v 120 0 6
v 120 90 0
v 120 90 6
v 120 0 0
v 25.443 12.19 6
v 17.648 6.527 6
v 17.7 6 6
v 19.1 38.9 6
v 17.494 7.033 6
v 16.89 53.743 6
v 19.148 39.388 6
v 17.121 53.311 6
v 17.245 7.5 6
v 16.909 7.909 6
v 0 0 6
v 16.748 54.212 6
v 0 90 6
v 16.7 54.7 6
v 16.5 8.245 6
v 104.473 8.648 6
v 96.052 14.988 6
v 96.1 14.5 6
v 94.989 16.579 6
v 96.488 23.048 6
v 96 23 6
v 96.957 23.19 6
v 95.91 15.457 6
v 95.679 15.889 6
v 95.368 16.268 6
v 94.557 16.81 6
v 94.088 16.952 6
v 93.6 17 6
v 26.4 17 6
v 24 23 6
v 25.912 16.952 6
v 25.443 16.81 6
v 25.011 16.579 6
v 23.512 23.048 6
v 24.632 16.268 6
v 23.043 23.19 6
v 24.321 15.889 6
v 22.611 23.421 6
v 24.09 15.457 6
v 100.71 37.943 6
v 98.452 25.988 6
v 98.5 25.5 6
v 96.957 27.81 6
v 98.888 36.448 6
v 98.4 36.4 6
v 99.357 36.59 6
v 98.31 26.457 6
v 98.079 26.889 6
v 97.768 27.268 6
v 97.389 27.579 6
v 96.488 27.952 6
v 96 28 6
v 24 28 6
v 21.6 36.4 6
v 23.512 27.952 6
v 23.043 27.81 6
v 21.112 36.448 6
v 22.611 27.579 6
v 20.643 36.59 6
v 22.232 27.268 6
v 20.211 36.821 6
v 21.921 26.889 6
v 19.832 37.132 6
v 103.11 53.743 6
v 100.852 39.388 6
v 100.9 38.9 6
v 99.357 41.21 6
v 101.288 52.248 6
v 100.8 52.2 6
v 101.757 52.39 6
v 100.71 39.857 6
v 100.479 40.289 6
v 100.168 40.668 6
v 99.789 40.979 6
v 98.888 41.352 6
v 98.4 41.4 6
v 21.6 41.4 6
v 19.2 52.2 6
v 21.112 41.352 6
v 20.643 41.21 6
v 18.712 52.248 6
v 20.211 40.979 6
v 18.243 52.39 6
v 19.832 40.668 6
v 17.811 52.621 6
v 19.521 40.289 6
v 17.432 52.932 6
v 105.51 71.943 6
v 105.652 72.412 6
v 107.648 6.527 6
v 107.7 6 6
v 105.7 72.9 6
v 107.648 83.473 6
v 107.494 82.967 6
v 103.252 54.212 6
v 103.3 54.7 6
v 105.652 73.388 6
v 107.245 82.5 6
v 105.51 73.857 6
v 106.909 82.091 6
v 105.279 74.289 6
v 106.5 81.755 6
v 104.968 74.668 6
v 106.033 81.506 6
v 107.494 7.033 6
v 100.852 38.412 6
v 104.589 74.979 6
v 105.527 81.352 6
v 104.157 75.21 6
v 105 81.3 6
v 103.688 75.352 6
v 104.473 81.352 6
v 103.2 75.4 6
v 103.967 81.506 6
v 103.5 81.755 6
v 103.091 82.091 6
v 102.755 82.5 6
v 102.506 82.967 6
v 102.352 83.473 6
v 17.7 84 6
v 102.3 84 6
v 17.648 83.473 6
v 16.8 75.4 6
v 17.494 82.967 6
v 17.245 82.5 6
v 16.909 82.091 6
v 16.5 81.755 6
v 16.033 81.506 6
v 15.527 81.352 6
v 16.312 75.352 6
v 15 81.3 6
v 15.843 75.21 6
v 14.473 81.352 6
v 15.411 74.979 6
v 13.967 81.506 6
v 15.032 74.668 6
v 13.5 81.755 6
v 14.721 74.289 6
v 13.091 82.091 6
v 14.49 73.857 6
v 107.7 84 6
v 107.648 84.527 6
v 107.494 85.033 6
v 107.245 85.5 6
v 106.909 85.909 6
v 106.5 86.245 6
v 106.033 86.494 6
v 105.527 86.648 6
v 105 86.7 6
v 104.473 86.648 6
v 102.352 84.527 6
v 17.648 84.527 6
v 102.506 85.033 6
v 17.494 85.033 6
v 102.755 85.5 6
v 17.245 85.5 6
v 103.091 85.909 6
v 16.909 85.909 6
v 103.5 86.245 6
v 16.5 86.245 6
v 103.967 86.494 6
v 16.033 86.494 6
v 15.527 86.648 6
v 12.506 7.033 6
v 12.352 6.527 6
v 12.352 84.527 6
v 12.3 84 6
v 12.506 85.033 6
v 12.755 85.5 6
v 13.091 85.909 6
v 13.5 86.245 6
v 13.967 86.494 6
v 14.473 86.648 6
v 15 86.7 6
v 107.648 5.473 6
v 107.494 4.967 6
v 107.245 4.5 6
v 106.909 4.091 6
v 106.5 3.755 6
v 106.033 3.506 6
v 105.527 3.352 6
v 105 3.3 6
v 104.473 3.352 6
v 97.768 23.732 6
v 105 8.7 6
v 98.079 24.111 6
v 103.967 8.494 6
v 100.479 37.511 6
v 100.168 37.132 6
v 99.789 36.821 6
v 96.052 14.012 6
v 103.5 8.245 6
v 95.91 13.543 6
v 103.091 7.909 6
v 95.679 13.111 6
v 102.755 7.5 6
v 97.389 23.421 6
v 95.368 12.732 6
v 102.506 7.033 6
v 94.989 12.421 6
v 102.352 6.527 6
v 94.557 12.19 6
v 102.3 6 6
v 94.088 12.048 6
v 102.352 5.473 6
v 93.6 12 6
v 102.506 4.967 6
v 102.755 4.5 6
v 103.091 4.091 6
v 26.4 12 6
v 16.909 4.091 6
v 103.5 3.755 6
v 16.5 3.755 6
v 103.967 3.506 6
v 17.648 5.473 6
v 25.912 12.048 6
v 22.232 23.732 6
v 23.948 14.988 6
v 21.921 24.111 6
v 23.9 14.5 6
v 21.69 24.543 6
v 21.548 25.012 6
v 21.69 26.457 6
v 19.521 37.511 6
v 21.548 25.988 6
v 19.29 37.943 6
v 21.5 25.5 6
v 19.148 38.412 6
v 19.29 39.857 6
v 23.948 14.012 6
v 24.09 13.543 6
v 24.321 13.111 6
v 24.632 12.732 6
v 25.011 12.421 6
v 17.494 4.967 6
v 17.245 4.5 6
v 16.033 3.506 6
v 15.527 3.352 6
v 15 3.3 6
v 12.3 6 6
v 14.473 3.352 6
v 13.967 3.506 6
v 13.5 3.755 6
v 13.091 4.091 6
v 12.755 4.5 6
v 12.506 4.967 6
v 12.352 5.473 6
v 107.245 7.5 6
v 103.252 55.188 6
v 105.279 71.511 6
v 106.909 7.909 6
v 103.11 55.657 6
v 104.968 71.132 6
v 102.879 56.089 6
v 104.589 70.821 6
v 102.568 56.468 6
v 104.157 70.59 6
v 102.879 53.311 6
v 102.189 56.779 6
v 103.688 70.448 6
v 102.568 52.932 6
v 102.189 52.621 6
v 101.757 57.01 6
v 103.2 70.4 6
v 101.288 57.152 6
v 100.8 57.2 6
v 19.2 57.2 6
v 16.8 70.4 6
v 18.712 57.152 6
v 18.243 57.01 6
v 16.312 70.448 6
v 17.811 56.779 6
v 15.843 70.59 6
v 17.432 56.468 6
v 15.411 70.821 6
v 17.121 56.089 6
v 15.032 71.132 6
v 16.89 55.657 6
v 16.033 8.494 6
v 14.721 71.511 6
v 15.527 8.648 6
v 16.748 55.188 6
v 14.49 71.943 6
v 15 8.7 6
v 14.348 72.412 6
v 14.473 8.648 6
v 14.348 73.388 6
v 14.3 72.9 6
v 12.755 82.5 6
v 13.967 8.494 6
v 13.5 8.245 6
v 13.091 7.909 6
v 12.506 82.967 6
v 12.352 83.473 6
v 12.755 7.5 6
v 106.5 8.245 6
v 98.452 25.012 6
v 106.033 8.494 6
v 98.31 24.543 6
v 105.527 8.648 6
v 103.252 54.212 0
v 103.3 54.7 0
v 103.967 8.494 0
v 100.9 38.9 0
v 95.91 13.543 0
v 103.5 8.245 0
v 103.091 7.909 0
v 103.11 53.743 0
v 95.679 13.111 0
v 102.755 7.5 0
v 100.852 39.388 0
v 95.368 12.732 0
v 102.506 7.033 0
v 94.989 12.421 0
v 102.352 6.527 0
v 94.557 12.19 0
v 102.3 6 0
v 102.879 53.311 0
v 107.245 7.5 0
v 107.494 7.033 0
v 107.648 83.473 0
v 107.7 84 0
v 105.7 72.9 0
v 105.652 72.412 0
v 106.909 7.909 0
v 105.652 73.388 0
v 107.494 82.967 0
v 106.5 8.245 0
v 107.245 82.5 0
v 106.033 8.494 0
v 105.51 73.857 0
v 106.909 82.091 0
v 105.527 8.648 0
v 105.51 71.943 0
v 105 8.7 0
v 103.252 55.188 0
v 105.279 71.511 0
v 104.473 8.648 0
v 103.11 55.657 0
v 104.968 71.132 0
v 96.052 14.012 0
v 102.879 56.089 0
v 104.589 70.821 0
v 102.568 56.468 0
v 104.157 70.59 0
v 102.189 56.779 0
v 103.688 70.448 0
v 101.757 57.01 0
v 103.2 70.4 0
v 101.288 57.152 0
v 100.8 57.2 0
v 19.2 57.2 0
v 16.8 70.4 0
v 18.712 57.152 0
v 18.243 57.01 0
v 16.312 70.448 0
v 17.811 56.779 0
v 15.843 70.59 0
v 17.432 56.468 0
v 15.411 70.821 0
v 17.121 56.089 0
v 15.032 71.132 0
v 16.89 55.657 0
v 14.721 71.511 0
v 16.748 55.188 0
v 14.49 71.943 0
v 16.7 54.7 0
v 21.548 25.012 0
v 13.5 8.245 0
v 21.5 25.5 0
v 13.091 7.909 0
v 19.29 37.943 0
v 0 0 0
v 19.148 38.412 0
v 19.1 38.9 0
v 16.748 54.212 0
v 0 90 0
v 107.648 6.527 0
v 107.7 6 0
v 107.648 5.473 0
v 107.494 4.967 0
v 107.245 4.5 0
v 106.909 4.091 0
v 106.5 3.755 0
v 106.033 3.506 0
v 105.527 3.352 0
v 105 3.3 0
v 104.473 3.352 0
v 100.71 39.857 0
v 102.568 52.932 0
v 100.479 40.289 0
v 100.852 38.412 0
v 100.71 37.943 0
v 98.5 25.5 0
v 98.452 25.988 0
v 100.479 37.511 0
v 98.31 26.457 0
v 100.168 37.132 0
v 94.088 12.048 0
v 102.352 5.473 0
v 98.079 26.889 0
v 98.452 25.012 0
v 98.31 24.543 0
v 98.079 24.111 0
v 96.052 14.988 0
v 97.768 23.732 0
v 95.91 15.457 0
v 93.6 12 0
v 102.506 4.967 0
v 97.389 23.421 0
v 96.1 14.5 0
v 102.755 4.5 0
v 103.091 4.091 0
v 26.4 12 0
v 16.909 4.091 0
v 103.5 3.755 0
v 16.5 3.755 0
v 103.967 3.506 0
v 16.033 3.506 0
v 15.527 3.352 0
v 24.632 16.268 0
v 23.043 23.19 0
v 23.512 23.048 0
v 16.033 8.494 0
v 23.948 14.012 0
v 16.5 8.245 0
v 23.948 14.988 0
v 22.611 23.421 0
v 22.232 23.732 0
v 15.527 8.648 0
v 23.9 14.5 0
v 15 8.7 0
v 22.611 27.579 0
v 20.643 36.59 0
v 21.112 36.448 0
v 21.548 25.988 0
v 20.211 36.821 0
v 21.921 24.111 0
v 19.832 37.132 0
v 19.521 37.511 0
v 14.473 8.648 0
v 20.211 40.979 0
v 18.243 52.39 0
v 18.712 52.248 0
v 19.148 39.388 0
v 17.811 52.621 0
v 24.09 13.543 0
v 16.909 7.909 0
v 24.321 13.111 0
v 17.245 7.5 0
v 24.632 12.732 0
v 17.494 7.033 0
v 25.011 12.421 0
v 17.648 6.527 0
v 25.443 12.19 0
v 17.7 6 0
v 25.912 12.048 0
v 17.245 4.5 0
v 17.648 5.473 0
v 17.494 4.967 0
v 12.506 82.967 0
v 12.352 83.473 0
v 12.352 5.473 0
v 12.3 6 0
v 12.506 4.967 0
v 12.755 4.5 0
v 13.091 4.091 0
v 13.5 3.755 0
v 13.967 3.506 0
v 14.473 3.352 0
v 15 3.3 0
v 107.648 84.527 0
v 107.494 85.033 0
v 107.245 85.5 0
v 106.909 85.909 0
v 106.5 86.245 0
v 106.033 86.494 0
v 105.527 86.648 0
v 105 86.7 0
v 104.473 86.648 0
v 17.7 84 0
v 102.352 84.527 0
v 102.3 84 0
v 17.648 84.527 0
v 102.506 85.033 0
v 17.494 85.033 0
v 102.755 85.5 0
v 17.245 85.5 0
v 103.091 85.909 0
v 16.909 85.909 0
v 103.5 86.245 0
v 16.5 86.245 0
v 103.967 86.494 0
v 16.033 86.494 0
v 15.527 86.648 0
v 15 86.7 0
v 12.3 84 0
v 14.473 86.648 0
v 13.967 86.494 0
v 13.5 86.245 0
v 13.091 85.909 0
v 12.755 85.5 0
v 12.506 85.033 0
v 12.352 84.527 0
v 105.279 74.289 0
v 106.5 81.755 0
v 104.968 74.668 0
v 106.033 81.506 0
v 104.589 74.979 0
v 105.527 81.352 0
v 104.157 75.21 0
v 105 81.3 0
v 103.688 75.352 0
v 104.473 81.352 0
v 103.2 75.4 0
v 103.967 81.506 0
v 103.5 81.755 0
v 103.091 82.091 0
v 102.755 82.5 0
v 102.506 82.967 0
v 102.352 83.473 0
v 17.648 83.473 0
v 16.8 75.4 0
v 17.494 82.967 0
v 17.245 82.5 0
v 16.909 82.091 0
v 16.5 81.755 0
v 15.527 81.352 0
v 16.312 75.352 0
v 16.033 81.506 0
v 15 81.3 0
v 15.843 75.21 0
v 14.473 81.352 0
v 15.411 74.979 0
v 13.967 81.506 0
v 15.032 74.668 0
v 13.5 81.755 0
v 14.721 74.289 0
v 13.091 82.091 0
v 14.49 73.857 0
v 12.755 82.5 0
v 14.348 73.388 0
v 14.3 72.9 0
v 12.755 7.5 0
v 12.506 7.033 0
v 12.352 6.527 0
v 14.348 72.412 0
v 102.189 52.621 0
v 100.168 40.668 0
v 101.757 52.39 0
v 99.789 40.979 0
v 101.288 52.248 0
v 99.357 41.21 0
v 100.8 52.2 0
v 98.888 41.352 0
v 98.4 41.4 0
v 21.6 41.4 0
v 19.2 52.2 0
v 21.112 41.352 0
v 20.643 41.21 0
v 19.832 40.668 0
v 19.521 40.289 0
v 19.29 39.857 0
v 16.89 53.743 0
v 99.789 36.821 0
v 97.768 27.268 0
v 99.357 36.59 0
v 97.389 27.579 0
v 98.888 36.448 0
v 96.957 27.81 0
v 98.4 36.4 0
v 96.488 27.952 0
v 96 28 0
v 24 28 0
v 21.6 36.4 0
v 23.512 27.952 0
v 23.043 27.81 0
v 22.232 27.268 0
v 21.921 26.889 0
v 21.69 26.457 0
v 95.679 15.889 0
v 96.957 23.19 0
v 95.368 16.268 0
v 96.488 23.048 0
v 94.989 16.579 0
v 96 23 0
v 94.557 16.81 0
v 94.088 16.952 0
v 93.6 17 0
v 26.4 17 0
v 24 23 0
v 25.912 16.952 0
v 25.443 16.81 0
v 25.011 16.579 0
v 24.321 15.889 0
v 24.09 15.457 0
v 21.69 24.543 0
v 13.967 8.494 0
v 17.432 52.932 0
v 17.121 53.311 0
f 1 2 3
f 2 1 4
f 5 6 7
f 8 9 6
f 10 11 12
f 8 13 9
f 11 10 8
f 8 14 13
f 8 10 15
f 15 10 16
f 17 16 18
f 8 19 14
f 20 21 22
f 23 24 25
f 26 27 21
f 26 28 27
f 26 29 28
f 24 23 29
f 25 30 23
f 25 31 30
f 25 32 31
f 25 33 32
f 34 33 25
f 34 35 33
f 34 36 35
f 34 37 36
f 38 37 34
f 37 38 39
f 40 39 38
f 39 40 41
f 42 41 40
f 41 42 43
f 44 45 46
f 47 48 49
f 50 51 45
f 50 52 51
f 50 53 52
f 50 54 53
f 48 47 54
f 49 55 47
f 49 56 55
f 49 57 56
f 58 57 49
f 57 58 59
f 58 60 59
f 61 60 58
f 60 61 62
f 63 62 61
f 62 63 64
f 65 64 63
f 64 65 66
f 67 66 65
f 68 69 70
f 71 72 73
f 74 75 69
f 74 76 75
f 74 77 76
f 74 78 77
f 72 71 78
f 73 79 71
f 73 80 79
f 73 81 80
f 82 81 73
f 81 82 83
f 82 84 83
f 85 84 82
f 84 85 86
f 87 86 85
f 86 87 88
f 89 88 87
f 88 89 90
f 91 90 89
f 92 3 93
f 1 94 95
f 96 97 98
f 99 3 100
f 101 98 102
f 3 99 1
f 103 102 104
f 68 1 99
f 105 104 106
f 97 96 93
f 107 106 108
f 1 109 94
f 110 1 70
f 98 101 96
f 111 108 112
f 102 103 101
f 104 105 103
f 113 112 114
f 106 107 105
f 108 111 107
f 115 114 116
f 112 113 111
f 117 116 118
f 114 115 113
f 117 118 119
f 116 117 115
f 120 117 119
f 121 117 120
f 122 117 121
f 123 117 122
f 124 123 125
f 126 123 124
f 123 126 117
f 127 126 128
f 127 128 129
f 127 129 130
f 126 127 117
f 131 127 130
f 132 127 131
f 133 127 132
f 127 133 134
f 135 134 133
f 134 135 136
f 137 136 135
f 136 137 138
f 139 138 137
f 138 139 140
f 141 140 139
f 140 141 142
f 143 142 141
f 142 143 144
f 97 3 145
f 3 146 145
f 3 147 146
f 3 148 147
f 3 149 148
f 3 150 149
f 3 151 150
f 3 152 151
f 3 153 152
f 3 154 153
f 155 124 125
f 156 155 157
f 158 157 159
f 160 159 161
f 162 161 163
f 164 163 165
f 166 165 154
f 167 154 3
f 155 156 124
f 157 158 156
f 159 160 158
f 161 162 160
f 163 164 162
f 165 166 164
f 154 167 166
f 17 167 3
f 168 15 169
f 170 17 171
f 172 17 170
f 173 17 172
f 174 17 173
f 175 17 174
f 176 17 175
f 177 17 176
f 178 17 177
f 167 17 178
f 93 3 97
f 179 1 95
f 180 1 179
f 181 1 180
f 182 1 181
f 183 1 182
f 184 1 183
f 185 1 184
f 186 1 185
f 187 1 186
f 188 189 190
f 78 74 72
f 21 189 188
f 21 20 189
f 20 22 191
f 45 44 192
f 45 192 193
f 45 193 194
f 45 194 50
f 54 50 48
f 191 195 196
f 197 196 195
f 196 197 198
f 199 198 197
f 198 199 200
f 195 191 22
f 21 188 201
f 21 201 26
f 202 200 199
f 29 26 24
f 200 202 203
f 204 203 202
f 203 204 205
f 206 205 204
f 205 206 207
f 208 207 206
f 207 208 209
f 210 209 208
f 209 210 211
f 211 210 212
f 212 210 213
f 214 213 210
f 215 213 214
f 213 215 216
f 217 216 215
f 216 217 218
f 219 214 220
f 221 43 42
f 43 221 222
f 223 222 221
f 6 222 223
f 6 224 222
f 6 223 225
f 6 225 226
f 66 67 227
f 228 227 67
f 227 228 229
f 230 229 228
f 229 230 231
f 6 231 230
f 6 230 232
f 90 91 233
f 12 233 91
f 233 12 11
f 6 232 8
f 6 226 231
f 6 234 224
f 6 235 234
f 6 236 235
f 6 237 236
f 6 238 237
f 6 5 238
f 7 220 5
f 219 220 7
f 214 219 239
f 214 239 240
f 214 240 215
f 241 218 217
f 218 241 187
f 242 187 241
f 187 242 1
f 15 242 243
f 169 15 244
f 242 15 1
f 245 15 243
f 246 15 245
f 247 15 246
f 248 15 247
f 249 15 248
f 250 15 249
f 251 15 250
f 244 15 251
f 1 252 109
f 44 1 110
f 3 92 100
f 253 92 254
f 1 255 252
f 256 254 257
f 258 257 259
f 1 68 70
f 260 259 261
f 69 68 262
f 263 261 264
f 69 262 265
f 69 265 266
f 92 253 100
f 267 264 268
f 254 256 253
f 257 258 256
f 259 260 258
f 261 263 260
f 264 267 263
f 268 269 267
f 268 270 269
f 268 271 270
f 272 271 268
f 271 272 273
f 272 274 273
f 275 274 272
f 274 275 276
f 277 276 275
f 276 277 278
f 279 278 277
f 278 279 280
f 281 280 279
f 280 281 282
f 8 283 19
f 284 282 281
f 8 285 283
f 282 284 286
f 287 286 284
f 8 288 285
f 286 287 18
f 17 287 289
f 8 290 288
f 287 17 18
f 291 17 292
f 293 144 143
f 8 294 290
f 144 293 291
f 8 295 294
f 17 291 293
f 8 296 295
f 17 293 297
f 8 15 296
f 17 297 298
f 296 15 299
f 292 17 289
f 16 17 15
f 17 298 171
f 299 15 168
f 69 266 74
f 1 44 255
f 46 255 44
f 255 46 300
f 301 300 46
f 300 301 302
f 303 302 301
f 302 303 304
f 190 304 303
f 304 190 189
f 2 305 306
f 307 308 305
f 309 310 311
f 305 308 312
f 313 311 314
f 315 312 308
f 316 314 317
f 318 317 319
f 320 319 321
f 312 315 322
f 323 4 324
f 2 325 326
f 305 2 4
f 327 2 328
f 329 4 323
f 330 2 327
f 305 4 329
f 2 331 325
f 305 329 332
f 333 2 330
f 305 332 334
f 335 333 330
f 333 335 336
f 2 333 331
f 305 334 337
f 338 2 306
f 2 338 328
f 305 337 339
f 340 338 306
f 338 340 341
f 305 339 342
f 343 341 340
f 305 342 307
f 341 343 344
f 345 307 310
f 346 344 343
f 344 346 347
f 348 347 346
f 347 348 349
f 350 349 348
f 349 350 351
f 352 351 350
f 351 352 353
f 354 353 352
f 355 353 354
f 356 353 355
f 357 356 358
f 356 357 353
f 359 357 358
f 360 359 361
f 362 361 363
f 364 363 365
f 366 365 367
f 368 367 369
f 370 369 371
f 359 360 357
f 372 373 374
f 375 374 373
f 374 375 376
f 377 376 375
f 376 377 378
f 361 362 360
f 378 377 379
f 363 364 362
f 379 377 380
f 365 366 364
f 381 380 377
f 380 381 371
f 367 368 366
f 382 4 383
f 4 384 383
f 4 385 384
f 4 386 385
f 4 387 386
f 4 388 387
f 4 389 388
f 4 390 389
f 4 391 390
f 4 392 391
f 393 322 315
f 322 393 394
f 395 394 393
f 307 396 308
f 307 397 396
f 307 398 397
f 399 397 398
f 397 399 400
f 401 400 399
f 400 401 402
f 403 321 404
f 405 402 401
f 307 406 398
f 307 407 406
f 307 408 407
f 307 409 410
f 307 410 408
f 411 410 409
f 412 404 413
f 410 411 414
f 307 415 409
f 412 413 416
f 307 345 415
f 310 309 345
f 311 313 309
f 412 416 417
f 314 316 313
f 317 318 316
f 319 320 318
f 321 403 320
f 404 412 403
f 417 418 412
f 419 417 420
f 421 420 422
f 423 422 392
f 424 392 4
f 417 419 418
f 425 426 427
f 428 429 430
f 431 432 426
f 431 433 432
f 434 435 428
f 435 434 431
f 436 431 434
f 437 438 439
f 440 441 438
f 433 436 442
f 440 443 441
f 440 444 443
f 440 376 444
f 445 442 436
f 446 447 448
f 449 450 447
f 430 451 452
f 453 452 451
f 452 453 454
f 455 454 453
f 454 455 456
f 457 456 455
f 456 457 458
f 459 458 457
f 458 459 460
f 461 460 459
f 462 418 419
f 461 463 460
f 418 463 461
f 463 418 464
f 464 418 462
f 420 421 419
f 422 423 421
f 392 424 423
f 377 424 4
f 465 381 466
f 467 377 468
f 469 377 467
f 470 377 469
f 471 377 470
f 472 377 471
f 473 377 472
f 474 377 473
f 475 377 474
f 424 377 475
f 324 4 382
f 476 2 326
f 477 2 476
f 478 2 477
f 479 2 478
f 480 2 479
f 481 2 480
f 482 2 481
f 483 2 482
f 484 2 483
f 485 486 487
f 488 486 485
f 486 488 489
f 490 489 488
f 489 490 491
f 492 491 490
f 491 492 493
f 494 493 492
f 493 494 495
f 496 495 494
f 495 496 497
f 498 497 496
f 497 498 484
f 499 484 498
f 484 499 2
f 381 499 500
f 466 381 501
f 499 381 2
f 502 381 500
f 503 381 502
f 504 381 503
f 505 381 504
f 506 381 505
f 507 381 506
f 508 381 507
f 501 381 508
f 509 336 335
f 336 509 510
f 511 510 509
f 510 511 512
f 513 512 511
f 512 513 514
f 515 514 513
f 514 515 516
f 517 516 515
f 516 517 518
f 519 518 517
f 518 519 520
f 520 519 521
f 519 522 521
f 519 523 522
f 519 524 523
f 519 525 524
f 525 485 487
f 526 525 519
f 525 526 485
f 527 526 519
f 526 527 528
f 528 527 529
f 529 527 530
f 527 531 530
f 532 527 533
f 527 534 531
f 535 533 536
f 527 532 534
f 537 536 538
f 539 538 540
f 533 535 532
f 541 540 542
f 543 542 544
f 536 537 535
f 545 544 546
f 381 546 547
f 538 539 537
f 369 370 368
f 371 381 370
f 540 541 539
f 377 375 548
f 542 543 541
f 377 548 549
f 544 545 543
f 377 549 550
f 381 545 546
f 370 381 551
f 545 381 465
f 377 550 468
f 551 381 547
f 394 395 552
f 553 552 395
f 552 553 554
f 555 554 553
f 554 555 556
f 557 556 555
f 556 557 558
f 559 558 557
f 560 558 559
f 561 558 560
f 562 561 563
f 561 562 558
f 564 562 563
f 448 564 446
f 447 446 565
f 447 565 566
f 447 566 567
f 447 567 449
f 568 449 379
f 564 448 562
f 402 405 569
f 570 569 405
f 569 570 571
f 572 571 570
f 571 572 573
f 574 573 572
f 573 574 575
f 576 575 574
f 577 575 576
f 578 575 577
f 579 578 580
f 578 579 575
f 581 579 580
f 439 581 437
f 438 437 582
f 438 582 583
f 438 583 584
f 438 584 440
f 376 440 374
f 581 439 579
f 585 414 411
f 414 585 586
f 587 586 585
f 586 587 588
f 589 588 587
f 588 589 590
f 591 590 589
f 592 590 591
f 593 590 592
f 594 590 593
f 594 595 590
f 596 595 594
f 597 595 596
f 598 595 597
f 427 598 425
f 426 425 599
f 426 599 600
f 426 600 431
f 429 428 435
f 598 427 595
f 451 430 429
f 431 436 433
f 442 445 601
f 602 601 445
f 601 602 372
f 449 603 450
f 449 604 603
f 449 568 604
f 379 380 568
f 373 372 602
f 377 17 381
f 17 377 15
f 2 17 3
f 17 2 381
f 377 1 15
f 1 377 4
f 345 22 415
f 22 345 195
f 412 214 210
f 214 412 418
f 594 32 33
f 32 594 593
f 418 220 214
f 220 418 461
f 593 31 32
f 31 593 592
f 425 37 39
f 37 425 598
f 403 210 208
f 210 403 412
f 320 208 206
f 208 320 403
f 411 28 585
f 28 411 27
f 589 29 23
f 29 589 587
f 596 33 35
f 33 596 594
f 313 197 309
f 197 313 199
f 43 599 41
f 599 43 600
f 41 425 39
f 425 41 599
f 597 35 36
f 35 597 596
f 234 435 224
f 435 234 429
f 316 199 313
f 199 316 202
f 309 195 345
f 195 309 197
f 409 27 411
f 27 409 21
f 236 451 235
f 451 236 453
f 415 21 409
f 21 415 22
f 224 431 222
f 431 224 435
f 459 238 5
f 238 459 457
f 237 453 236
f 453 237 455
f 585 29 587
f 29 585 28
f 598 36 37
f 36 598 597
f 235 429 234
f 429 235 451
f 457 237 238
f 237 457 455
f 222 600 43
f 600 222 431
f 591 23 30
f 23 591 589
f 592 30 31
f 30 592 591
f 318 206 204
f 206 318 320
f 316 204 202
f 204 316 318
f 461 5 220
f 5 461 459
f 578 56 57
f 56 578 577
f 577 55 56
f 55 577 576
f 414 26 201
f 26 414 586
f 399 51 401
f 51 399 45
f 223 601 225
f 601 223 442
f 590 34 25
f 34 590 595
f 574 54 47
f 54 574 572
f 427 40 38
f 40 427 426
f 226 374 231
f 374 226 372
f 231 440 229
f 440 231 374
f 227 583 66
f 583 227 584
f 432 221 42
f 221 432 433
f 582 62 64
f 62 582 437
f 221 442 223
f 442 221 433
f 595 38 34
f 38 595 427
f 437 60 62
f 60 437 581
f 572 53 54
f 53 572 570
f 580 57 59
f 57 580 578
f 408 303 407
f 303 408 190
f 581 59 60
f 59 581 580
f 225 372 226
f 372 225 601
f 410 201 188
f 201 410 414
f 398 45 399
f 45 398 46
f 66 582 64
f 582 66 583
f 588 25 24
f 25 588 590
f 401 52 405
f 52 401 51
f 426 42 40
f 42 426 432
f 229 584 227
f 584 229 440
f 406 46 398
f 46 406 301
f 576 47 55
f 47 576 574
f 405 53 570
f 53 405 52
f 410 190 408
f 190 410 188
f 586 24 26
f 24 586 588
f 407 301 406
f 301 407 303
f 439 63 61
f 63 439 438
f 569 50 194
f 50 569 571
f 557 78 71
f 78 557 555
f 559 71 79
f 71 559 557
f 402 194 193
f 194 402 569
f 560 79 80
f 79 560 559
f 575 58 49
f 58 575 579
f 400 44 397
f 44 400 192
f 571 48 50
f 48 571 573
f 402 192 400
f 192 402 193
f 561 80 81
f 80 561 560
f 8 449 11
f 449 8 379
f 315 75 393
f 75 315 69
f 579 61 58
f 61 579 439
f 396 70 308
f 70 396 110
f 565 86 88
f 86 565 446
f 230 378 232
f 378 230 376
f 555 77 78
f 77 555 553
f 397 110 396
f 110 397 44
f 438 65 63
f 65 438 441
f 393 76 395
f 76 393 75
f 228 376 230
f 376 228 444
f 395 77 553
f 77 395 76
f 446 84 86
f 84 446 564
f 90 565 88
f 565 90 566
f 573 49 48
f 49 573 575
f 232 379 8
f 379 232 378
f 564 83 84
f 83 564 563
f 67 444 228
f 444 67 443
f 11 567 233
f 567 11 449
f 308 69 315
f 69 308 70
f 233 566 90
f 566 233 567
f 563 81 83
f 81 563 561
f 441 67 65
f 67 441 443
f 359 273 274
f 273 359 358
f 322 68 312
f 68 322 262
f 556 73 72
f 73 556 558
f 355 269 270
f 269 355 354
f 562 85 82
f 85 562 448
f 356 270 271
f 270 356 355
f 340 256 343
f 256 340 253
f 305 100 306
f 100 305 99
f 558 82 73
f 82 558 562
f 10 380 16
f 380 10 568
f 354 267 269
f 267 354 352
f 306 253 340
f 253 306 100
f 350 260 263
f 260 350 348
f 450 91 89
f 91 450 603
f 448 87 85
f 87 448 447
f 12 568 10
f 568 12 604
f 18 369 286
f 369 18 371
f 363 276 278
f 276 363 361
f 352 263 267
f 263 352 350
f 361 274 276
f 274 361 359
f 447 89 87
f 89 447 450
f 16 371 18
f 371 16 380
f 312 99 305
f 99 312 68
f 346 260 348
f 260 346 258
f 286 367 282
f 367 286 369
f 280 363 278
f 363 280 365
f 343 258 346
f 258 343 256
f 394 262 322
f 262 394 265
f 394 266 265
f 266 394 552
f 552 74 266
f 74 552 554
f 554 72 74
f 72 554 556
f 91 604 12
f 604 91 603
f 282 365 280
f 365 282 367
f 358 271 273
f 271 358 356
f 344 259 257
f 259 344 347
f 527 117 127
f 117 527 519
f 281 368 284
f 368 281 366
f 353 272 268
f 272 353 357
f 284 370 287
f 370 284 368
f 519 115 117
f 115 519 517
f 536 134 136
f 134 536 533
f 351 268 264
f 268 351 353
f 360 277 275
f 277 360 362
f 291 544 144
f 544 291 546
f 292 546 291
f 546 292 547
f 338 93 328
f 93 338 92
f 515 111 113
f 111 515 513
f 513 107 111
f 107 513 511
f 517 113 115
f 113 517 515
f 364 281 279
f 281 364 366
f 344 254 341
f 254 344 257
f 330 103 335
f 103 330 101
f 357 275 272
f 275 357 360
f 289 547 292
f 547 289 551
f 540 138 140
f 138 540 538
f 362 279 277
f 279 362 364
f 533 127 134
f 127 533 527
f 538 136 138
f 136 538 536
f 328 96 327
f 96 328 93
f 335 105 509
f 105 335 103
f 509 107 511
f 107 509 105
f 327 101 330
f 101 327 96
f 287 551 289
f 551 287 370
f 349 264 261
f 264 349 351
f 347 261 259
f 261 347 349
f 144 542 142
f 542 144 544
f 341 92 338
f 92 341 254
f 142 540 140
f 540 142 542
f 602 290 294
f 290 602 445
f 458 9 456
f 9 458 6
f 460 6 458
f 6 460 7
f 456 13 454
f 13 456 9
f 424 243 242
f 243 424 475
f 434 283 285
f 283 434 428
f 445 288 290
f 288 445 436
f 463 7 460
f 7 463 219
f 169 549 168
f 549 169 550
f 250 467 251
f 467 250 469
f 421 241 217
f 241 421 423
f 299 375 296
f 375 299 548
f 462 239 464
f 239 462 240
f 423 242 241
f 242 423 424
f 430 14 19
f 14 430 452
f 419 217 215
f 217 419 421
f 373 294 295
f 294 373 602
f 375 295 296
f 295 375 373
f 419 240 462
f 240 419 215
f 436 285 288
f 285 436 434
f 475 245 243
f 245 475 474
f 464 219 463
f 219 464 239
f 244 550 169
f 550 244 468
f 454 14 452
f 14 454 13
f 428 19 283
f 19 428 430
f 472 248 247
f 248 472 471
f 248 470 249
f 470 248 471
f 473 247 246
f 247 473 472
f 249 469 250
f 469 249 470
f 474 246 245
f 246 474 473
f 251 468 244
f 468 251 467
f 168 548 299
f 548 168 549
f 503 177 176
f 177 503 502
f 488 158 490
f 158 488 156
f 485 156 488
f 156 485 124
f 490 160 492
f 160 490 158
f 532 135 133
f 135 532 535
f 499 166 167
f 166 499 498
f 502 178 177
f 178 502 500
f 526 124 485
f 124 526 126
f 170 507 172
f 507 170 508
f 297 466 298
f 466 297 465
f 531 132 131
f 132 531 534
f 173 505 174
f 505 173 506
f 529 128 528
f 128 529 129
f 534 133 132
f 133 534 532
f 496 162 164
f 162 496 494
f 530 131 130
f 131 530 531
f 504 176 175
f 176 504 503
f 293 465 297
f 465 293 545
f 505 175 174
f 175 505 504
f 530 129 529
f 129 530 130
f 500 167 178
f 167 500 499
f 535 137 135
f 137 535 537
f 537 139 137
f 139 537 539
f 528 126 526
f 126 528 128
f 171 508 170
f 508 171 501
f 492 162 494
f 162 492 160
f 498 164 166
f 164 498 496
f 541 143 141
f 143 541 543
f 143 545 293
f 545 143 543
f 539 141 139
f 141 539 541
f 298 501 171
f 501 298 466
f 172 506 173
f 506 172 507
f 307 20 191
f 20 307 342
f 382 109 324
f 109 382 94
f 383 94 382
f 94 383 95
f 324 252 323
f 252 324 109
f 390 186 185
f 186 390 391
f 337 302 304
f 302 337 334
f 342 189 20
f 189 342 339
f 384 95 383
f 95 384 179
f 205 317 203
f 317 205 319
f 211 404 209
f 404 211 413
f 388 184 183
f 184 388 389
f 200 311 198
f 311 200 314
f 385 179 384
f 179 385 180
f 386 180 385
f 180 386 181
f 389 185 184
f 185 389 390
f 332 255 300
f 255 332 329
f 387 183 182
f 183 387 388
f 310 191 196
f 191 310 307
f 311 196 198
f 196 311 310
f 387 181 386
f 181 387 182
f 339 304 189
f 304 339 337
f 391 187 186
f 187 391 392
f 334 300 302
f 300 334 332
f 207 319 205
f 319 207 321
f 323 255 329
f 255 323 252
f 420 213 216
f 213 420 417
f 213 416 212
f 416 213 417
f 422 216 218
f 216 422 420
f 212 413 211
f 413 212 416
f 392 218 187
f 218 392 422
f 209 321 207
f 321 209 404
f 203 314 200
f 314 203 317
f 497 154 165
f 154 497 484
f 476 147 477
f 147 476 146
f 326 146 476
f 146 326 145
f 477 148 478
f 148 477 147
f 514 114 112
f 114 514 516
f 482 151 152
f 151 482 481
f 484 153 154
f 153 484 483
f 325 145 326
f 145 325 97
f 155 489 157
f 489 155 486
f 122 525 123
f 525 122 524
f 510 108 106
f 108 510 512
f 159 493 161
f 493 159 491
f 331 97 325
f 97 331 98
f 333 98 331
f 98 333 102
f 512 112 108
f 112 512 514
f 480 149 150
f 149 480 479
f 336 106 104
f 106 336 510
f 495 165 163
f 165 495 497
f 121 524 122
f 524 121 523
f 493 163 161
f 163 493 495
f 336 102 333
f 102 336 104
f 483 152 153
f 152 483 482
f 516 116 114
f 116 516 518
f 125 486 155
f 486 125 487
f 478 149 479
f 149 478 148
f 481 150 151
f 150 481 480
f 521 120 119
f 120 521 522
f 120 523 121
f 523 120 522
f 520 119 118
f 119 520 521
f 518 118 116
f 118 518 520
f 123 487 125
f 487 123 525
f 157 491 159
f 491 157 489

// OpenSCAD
$fn = 32;

// ----------------------------------------------------------------------
// Slotted panel: 120 x 90 mm, 5 рядов of slots
// ----------------------------------------------------------------------

// --- parameters (mm) ---
panel_w = 120;            // panel width
panel_d = 90;             // panel depth
thick = 6;                // panel thickness
slot_w = 5;               // slot width
pitch0 = 11;              // first row pitch
pitch_step = 2.4;         // pitch increase per row
margin = 12;              // margin around the slot field
rows = 5;                 // number of slot rows
mount_d = 5.4;            // mounting holes
mount_x = 45;             // mounting hole offset

difference() {
  union() {
    cube([panel_w, panel_d, thick]);
  }
  /* slot rows: stadium shaped cutters, 2.5 mm clear of both faces */
  /* row 0: pitch 11, length 67.2 */
  hull() {
    translate([26.4, 14.5, -2.5]) cylinder(h = thick + 5, d = slot_w);
    translate([93.6, 14.5, -2.5]) cylinder(h = thick + 5, d = slot_w);
  }
  /* row 1: pitch 13.4, length 72 */
  hull() {
    translate([24, 25.5, -2.5]) cylinder(h = thick + 5, d = slot_w);
    translate([96, 25.5, -2.5]) cylinder(h = thick + 5, d = slot_w);
  }
  /* row 2: pitch 15.8, length 76.8 */
  hull() {
    translate([21.6, 38.9, -2.5]) cylinder(h = thick + 5, d = slot_w);
    translate([98.4, 38.9, -2.5]) cylinder(h = thick + 5, d = slot_w);
  }
  /* row 3: pitch 18.2, length 81.6 */
  hull() {
    translate([19.2, 54.7, -2.5]) cylinder(h = thick + 5, d = slot_w);
    translate([100.8, 54.7, -2.5]) cylinder(h = thick + 5, d = slot_w);
  }
  /* row 4: pitch 20.6, length 86.4 */
  hull() {
    translate([16.8, 72.9, -2.5]) cylinder(h = thick + 5, d = slot_w);
    translate([103.2, 72.9, -2.5]) cylinder(h = thick + 5, d = slot_w);
  }
  translate([15, 6, -2.5]) cylinder(h = 11, d = mount_d);
  translate([15, 84, -2.5]) cylinder(h = 11, d = mount_d);
  translate([105, 6, -2.5]) cylinder(h = 11, d = mount_d);
  translate([105, 84, -2.5]) cylinder(h = 11, d = mount_d);
}
